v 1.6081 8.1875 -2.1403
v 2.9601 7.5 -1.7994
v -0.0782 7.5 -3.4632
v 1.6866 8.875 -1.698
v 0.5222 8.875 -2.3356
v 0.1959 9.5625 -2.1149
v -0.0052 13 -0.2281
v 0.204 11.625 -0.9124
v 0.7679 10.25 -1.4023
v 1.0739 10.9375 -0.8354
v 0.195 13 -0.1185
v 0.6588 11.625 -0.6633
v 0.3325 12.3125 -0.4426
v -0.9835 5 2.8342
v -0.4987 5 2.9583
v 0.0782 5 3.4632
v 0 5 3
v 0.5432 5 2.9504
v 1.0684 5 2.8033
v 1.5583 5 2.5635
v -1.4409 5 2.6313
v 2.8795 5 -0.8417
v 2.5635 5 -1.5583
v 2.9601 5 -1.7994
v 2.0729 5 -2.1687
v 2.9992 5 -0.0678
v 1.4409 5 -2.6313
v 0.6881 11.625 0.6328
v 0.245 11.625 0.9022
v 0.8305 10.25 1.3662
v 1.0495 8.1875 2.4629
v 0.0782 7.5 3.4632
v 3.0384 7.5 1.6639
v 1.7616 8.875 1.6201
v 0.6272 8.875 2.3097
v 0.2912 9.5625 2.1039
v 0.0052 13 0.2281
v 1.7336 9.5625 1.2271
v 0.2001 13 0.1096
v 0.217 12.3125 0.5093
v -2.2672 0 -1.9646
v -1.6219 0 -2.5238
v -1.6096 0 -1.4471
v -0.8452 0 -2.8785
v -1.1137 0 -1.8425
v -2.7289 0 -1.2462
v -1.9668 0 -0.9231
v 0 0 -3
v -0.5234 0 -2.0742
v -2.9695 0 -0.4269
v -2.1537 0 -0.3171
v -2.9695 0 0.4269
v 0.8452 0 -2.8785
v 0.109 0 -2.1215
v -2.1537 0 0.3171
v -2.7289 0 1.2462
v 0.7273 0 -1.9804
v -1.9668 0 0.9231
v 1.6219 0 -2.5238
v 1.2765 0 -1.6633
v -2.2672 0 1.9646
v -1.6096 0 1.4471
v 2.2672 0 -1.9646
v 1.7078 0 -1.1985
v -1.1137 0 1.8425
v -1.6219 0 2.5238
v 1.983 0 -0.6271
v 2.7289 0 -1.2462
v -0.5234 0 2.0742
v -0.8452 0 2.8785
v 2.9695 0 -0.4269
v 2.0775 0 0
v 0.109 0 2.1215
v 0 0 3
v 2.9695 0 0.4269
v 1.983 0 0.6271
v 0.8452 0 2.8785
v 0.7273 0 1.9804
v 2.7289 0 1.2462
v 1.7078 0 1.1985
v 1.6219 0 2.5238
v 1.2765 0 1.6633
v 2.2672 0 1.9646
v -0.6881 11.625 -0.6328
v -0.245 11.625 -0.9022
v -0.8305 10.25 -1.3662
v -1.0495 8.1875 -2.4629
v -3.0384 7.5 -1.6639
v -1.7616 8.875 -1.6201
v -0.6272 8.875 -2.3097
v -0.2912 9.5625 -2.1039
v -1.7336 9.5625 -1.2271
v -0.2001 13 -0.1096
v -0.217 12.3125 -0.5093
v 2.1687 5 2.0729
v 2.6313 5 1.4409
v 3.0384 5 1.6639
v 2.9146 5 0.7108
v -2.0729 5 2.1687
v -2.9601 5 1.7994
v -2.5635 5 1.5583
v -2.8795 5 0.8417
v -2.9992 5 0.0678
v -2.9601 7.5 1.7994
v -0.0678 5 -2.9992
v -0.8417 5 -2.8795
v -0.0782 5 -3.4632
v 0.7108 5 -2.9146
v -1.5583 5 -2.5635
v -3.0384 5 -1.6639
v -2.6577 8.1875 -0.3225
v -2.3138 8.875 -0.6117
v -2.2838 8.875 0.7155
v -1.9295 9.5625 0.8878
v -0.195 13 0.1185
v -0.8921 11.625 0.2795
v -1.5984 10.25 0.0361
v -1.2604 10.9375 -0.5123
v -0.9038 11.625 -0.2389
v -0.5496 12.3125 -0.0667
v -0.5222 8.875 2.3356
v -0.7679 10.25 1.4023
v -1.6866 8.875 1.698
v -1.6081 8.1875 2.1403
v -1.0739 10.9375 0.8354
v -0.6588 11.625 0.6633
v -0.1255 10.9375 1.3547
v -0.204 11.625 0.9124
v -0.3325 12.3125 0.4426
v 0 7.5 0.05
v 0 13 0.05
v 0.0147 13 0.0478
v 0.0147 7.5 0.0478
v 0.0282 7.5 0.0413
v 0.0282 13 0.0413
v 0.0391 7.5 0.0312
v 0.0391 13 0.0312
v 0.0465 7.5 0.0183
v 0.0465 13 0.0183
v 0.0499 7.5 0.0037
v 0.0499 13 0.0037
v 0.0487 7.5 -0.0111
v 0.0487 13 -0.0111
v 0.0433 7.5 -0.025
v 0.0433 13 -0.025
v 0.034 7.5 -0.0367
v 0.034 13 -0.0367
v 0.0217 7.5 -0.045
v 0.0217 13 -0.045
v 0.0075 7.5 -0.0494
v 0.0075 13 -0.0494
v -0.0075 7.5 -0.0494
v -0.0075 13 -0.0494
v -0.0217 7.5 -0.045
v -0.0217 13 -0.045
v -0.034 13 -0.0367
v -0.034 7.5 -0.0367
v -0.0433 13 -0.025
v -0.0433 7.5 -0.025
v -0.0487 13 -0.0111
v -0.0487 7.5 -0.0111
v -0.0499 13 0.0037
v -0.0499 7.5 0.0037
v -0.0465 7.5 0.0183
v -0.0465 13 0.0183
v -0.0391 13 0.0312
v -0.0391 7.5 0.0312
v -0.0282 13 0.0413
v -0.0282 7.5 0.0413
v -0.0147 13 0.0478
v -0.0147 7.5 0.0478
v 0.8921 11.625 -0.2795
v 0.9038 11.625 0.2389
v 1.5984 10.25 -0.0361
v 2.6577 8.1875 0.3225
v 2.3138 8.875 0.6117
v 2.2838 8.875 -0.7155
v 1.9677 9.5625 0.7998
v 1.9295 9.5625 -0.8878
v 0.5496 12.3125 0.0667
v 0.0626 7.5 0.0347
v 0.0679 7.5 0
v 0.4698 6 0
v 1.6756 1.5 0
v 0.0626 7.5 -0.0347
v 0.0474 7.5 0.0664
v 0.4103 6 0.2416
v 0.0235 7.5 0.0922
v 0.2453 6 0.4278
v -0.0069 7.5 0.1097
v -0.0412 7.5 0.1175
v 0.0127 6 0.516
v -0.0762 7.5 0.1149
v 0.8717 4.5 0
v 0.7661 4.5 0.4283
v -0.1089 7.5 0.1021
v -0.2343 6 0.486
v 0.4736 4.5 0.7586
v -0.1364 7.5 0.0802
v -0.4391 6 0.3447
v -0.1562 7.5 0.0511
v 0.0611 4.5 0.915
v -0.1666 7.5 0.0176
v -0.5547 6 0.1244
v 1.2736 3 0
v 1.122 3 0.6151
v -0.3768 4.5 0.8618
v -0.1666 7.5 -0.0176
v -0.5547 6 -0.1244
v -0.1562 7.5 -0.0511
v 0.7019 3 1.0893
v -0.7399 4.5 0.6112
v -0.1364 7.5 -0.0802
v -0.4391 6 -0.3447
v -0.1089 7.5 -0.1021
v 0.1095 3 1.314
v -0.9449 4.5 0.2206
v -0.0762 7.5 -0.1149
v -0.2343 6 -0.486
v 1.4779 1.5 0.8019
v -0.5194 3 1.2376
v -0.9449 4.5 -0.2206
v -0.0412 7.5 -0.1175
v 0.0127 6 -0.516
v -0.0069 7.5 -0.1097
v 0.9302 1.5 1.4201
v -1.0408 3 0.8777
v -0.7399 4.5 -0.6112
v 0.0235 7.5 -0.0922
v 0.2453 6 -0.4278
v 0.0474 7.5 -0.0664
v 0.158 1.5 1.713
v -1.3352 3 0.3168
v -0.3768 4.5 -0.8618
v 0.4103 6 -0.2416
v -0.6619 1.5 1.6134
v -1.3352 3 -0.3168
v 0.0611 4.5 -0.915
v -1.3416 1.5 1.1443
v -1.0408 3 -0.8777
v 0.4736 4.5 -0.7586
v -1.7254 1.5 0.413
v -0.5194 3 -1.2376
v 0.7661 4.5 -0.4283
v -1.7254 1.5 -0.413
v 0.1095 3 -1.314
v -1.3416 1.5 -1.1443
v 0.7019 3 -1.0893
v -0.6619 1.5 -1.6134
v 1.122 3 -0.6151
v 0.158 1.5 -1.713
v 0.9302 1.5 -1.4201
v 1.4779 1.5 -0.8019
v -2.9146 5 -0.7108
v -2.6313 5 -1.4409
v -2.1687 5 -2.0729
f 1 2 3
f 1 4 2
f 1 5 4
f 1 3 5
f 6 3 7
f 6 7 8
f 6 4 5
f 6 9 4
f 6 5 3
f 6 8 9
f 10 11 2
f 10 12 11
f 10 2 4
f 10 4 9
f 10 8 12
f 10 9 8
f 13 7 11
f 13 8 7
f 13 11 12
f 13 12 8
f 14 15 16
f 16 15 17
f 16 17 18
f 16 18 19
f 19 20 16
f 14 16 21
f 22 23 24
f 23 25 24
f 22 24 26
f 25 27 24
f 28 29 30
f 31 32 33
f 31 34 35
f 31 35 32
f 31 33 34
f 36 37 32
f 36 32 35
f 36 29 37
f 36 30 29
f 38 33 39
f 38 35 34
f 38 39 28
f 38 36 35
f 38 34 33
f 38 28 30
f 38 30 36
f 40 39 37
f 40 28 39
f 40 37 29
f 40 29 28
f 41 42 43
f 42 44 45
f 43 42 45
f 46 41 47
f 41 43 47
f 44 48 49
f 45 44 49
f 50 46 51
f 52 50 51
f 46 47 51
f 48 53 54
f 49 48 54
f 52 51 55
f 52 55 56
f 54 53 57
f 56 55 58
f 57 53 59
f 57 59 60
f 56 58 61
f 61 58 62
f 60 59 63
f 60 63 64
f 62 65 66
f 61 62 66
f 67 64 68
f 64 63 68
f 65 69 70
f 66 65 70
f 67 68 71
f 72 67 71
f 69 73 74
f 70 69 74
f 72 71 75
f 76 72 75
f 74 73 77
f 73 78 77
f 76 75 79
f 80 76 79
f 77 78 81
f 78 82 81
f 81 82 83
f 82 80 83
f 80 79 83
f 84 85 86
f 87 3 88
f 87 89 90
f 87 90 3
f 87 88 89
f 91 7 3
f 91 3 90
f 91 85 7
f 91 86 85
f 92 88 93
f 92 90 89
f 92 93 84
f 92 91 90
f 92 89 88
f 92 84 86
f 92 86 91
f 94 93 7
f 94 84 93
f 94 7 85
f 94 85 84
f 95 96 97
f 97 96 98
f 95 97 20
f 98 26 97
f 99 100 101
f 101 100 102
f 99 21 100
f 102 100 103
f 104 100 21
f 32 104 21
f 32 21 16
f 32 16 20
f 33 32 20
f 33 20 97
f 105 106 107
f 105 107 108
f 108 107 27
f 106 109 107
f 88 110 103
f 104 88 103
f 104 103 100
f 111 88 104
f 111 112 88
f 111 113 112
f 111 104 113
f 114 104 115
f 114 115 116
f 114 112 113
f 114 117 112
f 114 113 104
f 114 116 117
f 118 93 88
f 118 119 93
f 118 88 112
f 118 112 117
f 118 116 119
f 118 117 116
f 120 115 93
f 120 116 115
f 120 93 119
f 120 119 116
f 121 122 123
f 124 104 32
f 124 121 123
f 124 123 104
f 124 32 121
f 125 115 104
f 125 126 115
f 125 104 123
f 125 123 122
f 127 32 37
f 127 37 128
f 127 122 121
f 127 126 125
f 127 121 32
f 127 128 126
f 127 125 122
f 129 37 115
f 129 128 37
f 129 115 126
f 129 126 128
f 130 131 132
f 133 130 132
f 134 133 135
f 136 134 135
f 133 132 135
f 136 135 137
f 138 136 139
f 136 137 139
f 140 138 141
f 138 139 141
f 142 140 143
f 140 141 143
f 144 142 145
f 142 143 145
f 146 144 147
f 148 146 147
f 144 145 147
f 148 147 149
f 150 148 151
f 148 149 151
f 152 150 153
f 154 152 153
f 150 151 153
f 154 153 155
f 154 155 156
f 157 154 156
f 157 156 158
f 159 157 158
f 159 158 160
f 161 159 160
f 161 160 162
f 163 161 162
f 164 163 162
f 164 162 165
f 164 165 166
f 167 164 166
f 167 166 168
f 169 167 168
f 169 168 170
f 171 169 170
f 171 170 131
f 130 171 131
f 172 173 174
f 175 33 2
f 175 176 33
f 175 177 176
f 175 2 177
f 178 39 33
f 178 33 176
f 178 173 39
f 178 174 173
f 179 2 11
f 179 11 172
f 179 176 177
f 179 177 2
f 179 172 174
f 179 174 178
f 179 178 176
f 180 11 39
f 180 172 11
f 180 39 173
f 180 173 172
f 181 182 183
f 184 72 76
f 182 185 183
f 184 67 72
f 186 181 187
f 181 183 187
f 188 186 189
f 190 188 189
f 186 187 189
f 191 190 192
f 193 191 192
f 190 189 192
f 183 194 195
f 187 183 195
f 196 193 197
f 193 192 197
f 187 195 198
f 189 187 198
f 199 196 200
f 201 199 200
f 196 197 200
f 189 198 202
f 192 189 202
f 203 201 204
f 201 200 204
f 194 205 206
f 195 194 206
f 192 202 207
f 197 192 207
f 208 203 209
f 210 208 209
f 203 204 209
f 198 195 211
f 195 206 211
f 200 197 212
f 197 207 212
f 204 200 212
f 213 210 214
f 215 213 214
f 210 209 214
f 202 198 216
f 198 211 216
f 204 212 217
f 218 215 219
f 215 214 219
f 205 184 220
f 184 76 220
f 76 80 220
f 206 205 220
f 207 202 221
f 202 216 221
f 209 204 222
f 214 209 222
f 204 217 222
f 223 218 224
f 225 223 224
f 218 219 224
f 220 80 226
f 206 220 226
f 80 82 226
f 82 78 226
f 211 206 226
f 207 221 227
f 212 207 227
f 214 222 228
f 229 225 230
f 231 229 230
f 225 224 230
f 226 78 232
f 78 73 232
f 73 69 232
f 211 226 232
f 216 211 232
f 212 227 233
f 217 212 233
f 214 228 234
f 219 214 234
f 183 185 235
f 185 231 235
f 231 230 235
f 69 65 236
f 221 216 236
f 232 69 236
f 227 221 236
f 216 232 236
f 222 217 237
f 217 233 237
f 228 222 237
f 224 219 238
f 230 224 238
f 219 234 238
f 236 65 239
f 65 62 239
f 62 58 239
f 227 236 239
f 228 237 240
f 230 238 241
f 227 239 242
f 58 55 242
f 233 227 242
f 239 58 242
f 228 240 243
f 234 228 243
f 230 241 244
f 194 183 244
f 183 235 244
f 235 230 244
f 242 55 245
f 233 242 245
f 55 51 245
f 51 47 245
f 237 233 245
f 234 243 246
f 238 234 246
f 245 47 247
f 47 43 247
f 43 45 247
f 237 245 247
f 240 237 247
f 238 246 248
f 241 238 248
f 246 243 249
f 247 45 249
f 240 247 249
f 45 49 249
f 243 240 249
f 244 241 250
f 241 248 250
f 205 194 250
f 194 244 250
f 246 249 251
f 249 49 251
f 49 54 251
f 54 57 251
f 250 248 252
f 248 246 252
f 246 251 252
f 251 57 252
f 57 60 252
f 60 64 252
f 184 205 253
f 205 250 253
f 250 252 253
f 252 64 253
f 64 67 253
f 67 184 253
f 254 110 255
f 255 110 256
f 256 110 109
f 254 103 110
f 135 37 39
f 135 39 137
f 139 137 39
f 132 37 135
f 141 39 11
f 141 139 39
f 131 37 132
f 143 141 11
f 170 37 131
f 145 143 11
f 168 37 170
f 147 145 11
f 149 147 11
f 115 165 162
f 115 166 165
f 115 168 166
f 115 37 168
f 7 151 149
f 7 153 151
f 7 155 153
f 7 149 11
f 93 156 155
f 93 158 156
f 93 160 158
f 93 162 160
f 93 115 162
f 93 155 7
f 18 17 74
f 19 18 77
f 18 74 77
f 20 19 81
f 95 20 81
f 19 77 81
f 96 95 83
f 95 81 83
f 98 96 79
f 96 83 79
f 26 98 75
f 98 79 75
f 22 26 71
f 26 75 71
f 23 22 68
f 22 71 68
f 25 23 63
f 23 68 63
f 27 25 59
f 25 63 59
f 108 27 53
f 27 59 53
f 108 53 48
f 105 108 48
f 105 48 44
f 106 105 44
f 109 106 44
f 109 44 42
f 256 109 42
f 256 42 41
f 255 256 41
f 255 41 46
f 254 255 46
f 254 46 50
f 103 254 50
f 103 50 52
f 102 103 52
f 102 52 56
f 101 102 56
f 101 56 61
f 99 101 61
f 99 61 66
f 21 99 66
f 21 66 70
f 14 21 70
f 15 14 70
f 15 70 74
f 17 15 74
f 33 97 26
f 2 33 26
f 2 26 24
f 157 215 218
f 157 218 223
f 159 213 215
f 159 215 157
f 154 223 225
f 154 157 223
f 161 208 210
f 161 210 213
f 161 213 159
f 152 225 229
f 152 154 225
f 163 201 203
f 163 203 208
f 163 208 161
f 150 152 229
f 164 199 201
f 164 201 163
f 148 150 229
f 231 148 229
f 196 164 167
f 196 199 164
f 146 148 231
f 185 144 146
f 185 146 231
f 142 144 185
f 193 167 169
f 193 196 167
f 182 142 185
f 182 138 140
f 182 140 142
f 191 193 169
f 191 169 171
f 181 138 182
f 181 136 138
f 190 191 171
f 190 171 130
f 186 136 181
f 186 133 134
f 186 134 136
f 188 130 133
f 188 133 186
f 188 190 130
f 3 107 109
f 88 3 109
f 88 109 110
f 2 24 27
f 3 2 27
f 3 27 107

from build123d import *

# Parameters (mm, degrees)
SKETCH_1_R          = 3
EXTRUDE_1_DEPTH     = 5
EXTRUDE_2_DEPTH     = 2.5
EXTRUDE_3_DEPTH     = 5.5
EXTRUDE_3_TAPER     = 27
SKETCH_5_R          = 0.05
CUT_EXTRUDE_1_DEPTH = 14.792224458
SKETCH_6_R          = 2.127494577
CUT_EXTRUDE_2_DEPTH = 7.5
CUT_EXTRUDE_2_DRAFT = -15


with BuildPart() as part:
    # 草图1 → 凸台-拉伸1 (new body)
    with BuildSketch(Plane(origin=(0, 0, 0), x_dir=(1, 0, 0), z_dir=(0, 1, 0))):
        with Locations(Location((0, 0, 0), (0, 0, 270))):
            Circle(SKETCH_1_R)
    extrude(amount=EXTRUDE_1_DEPTH)

    # 草图2 → 凸台-拉伸2 (add)
    with BuildSketch(Plane(origin=(0, 5, 0), x_dir=(1, 0, 0), z_dir=(0, 1, 0))):
        Polygon((3.038350598, -1.663858661), (2.960119168, 1.799359473), (-0.07823143, 3.463218134), (-3.038350598, 1.663858661), (-2.960119168, -1.799359473), (0.07823143, -3.463218134), align=None)
    extrude(amount=EXTRUDE_2_DEPTH)

    # 草图4 → 凸台-拉伸3 (add)
    with BuildSketch(Plane(origin=(0, 7.5, 0), x_dir=(1, 0, 0), z_dir=(0, 1, 0))):
        Polygon((0.07823143, -3.463218134), (3.038350598, -1.663858661), (2.960119168, 1.799359473), (-0.07823143, 3.463218134), (-3.038350598, 1.663858661), (-2.960119168, -1.799359473), align=None)
    extrude(amount=EXTRUDE_3_DEPTH, taper=EXTRUDE_3_TAPER)

    # 草图5 → 切除-拉伸1 (cut, through all)
    with BuildSketch(Plane(origin=(0, 13, 0), x_dir=(1, 0, 0), z_dir=(0, 1, 0))):
        with Locations(Location((0, 0, 0), (0, 0, 270))):
            Circle(SKETCH_5_R)
    extrude(amount=-CUT_EXTRUDE_1_DEPTH, mode=Mode.SUBTRACT)


with BuildPart() as cut_extrude_2_tool:
    # 草图6 → 切除-拉伸2 (with draft: the straight prism first)
    with BuildSketch(Plane.XZ):
        with Locations((-0.05, 0)):
            Circle(SKETCH_6_R)
    extrude(amount=-CUT_EXTRUDE_2_DEPTH)
    # 切除-拉伸2: the draft: its side faces are tilted about the plane it starts from
    cut_extrude_2_sides = [cut_extrude_2_tool.faces().sort_by_distance(p)[0] for p in [
        (-2.177494577, 3.75, 0),
    ]]
    draft(cut_extrude_2_sides, Plane.XZ, CUT_EXTRUDE_2_DRAFT)


with BuildPart() as part_1:
    add(part.part)

    # 切除-拉伸2: cut by cut_extrude_2_tool
    add(cut_extrude_2_tool.part, mode=Mode.SUBTRACT)


solid = part_1.part
